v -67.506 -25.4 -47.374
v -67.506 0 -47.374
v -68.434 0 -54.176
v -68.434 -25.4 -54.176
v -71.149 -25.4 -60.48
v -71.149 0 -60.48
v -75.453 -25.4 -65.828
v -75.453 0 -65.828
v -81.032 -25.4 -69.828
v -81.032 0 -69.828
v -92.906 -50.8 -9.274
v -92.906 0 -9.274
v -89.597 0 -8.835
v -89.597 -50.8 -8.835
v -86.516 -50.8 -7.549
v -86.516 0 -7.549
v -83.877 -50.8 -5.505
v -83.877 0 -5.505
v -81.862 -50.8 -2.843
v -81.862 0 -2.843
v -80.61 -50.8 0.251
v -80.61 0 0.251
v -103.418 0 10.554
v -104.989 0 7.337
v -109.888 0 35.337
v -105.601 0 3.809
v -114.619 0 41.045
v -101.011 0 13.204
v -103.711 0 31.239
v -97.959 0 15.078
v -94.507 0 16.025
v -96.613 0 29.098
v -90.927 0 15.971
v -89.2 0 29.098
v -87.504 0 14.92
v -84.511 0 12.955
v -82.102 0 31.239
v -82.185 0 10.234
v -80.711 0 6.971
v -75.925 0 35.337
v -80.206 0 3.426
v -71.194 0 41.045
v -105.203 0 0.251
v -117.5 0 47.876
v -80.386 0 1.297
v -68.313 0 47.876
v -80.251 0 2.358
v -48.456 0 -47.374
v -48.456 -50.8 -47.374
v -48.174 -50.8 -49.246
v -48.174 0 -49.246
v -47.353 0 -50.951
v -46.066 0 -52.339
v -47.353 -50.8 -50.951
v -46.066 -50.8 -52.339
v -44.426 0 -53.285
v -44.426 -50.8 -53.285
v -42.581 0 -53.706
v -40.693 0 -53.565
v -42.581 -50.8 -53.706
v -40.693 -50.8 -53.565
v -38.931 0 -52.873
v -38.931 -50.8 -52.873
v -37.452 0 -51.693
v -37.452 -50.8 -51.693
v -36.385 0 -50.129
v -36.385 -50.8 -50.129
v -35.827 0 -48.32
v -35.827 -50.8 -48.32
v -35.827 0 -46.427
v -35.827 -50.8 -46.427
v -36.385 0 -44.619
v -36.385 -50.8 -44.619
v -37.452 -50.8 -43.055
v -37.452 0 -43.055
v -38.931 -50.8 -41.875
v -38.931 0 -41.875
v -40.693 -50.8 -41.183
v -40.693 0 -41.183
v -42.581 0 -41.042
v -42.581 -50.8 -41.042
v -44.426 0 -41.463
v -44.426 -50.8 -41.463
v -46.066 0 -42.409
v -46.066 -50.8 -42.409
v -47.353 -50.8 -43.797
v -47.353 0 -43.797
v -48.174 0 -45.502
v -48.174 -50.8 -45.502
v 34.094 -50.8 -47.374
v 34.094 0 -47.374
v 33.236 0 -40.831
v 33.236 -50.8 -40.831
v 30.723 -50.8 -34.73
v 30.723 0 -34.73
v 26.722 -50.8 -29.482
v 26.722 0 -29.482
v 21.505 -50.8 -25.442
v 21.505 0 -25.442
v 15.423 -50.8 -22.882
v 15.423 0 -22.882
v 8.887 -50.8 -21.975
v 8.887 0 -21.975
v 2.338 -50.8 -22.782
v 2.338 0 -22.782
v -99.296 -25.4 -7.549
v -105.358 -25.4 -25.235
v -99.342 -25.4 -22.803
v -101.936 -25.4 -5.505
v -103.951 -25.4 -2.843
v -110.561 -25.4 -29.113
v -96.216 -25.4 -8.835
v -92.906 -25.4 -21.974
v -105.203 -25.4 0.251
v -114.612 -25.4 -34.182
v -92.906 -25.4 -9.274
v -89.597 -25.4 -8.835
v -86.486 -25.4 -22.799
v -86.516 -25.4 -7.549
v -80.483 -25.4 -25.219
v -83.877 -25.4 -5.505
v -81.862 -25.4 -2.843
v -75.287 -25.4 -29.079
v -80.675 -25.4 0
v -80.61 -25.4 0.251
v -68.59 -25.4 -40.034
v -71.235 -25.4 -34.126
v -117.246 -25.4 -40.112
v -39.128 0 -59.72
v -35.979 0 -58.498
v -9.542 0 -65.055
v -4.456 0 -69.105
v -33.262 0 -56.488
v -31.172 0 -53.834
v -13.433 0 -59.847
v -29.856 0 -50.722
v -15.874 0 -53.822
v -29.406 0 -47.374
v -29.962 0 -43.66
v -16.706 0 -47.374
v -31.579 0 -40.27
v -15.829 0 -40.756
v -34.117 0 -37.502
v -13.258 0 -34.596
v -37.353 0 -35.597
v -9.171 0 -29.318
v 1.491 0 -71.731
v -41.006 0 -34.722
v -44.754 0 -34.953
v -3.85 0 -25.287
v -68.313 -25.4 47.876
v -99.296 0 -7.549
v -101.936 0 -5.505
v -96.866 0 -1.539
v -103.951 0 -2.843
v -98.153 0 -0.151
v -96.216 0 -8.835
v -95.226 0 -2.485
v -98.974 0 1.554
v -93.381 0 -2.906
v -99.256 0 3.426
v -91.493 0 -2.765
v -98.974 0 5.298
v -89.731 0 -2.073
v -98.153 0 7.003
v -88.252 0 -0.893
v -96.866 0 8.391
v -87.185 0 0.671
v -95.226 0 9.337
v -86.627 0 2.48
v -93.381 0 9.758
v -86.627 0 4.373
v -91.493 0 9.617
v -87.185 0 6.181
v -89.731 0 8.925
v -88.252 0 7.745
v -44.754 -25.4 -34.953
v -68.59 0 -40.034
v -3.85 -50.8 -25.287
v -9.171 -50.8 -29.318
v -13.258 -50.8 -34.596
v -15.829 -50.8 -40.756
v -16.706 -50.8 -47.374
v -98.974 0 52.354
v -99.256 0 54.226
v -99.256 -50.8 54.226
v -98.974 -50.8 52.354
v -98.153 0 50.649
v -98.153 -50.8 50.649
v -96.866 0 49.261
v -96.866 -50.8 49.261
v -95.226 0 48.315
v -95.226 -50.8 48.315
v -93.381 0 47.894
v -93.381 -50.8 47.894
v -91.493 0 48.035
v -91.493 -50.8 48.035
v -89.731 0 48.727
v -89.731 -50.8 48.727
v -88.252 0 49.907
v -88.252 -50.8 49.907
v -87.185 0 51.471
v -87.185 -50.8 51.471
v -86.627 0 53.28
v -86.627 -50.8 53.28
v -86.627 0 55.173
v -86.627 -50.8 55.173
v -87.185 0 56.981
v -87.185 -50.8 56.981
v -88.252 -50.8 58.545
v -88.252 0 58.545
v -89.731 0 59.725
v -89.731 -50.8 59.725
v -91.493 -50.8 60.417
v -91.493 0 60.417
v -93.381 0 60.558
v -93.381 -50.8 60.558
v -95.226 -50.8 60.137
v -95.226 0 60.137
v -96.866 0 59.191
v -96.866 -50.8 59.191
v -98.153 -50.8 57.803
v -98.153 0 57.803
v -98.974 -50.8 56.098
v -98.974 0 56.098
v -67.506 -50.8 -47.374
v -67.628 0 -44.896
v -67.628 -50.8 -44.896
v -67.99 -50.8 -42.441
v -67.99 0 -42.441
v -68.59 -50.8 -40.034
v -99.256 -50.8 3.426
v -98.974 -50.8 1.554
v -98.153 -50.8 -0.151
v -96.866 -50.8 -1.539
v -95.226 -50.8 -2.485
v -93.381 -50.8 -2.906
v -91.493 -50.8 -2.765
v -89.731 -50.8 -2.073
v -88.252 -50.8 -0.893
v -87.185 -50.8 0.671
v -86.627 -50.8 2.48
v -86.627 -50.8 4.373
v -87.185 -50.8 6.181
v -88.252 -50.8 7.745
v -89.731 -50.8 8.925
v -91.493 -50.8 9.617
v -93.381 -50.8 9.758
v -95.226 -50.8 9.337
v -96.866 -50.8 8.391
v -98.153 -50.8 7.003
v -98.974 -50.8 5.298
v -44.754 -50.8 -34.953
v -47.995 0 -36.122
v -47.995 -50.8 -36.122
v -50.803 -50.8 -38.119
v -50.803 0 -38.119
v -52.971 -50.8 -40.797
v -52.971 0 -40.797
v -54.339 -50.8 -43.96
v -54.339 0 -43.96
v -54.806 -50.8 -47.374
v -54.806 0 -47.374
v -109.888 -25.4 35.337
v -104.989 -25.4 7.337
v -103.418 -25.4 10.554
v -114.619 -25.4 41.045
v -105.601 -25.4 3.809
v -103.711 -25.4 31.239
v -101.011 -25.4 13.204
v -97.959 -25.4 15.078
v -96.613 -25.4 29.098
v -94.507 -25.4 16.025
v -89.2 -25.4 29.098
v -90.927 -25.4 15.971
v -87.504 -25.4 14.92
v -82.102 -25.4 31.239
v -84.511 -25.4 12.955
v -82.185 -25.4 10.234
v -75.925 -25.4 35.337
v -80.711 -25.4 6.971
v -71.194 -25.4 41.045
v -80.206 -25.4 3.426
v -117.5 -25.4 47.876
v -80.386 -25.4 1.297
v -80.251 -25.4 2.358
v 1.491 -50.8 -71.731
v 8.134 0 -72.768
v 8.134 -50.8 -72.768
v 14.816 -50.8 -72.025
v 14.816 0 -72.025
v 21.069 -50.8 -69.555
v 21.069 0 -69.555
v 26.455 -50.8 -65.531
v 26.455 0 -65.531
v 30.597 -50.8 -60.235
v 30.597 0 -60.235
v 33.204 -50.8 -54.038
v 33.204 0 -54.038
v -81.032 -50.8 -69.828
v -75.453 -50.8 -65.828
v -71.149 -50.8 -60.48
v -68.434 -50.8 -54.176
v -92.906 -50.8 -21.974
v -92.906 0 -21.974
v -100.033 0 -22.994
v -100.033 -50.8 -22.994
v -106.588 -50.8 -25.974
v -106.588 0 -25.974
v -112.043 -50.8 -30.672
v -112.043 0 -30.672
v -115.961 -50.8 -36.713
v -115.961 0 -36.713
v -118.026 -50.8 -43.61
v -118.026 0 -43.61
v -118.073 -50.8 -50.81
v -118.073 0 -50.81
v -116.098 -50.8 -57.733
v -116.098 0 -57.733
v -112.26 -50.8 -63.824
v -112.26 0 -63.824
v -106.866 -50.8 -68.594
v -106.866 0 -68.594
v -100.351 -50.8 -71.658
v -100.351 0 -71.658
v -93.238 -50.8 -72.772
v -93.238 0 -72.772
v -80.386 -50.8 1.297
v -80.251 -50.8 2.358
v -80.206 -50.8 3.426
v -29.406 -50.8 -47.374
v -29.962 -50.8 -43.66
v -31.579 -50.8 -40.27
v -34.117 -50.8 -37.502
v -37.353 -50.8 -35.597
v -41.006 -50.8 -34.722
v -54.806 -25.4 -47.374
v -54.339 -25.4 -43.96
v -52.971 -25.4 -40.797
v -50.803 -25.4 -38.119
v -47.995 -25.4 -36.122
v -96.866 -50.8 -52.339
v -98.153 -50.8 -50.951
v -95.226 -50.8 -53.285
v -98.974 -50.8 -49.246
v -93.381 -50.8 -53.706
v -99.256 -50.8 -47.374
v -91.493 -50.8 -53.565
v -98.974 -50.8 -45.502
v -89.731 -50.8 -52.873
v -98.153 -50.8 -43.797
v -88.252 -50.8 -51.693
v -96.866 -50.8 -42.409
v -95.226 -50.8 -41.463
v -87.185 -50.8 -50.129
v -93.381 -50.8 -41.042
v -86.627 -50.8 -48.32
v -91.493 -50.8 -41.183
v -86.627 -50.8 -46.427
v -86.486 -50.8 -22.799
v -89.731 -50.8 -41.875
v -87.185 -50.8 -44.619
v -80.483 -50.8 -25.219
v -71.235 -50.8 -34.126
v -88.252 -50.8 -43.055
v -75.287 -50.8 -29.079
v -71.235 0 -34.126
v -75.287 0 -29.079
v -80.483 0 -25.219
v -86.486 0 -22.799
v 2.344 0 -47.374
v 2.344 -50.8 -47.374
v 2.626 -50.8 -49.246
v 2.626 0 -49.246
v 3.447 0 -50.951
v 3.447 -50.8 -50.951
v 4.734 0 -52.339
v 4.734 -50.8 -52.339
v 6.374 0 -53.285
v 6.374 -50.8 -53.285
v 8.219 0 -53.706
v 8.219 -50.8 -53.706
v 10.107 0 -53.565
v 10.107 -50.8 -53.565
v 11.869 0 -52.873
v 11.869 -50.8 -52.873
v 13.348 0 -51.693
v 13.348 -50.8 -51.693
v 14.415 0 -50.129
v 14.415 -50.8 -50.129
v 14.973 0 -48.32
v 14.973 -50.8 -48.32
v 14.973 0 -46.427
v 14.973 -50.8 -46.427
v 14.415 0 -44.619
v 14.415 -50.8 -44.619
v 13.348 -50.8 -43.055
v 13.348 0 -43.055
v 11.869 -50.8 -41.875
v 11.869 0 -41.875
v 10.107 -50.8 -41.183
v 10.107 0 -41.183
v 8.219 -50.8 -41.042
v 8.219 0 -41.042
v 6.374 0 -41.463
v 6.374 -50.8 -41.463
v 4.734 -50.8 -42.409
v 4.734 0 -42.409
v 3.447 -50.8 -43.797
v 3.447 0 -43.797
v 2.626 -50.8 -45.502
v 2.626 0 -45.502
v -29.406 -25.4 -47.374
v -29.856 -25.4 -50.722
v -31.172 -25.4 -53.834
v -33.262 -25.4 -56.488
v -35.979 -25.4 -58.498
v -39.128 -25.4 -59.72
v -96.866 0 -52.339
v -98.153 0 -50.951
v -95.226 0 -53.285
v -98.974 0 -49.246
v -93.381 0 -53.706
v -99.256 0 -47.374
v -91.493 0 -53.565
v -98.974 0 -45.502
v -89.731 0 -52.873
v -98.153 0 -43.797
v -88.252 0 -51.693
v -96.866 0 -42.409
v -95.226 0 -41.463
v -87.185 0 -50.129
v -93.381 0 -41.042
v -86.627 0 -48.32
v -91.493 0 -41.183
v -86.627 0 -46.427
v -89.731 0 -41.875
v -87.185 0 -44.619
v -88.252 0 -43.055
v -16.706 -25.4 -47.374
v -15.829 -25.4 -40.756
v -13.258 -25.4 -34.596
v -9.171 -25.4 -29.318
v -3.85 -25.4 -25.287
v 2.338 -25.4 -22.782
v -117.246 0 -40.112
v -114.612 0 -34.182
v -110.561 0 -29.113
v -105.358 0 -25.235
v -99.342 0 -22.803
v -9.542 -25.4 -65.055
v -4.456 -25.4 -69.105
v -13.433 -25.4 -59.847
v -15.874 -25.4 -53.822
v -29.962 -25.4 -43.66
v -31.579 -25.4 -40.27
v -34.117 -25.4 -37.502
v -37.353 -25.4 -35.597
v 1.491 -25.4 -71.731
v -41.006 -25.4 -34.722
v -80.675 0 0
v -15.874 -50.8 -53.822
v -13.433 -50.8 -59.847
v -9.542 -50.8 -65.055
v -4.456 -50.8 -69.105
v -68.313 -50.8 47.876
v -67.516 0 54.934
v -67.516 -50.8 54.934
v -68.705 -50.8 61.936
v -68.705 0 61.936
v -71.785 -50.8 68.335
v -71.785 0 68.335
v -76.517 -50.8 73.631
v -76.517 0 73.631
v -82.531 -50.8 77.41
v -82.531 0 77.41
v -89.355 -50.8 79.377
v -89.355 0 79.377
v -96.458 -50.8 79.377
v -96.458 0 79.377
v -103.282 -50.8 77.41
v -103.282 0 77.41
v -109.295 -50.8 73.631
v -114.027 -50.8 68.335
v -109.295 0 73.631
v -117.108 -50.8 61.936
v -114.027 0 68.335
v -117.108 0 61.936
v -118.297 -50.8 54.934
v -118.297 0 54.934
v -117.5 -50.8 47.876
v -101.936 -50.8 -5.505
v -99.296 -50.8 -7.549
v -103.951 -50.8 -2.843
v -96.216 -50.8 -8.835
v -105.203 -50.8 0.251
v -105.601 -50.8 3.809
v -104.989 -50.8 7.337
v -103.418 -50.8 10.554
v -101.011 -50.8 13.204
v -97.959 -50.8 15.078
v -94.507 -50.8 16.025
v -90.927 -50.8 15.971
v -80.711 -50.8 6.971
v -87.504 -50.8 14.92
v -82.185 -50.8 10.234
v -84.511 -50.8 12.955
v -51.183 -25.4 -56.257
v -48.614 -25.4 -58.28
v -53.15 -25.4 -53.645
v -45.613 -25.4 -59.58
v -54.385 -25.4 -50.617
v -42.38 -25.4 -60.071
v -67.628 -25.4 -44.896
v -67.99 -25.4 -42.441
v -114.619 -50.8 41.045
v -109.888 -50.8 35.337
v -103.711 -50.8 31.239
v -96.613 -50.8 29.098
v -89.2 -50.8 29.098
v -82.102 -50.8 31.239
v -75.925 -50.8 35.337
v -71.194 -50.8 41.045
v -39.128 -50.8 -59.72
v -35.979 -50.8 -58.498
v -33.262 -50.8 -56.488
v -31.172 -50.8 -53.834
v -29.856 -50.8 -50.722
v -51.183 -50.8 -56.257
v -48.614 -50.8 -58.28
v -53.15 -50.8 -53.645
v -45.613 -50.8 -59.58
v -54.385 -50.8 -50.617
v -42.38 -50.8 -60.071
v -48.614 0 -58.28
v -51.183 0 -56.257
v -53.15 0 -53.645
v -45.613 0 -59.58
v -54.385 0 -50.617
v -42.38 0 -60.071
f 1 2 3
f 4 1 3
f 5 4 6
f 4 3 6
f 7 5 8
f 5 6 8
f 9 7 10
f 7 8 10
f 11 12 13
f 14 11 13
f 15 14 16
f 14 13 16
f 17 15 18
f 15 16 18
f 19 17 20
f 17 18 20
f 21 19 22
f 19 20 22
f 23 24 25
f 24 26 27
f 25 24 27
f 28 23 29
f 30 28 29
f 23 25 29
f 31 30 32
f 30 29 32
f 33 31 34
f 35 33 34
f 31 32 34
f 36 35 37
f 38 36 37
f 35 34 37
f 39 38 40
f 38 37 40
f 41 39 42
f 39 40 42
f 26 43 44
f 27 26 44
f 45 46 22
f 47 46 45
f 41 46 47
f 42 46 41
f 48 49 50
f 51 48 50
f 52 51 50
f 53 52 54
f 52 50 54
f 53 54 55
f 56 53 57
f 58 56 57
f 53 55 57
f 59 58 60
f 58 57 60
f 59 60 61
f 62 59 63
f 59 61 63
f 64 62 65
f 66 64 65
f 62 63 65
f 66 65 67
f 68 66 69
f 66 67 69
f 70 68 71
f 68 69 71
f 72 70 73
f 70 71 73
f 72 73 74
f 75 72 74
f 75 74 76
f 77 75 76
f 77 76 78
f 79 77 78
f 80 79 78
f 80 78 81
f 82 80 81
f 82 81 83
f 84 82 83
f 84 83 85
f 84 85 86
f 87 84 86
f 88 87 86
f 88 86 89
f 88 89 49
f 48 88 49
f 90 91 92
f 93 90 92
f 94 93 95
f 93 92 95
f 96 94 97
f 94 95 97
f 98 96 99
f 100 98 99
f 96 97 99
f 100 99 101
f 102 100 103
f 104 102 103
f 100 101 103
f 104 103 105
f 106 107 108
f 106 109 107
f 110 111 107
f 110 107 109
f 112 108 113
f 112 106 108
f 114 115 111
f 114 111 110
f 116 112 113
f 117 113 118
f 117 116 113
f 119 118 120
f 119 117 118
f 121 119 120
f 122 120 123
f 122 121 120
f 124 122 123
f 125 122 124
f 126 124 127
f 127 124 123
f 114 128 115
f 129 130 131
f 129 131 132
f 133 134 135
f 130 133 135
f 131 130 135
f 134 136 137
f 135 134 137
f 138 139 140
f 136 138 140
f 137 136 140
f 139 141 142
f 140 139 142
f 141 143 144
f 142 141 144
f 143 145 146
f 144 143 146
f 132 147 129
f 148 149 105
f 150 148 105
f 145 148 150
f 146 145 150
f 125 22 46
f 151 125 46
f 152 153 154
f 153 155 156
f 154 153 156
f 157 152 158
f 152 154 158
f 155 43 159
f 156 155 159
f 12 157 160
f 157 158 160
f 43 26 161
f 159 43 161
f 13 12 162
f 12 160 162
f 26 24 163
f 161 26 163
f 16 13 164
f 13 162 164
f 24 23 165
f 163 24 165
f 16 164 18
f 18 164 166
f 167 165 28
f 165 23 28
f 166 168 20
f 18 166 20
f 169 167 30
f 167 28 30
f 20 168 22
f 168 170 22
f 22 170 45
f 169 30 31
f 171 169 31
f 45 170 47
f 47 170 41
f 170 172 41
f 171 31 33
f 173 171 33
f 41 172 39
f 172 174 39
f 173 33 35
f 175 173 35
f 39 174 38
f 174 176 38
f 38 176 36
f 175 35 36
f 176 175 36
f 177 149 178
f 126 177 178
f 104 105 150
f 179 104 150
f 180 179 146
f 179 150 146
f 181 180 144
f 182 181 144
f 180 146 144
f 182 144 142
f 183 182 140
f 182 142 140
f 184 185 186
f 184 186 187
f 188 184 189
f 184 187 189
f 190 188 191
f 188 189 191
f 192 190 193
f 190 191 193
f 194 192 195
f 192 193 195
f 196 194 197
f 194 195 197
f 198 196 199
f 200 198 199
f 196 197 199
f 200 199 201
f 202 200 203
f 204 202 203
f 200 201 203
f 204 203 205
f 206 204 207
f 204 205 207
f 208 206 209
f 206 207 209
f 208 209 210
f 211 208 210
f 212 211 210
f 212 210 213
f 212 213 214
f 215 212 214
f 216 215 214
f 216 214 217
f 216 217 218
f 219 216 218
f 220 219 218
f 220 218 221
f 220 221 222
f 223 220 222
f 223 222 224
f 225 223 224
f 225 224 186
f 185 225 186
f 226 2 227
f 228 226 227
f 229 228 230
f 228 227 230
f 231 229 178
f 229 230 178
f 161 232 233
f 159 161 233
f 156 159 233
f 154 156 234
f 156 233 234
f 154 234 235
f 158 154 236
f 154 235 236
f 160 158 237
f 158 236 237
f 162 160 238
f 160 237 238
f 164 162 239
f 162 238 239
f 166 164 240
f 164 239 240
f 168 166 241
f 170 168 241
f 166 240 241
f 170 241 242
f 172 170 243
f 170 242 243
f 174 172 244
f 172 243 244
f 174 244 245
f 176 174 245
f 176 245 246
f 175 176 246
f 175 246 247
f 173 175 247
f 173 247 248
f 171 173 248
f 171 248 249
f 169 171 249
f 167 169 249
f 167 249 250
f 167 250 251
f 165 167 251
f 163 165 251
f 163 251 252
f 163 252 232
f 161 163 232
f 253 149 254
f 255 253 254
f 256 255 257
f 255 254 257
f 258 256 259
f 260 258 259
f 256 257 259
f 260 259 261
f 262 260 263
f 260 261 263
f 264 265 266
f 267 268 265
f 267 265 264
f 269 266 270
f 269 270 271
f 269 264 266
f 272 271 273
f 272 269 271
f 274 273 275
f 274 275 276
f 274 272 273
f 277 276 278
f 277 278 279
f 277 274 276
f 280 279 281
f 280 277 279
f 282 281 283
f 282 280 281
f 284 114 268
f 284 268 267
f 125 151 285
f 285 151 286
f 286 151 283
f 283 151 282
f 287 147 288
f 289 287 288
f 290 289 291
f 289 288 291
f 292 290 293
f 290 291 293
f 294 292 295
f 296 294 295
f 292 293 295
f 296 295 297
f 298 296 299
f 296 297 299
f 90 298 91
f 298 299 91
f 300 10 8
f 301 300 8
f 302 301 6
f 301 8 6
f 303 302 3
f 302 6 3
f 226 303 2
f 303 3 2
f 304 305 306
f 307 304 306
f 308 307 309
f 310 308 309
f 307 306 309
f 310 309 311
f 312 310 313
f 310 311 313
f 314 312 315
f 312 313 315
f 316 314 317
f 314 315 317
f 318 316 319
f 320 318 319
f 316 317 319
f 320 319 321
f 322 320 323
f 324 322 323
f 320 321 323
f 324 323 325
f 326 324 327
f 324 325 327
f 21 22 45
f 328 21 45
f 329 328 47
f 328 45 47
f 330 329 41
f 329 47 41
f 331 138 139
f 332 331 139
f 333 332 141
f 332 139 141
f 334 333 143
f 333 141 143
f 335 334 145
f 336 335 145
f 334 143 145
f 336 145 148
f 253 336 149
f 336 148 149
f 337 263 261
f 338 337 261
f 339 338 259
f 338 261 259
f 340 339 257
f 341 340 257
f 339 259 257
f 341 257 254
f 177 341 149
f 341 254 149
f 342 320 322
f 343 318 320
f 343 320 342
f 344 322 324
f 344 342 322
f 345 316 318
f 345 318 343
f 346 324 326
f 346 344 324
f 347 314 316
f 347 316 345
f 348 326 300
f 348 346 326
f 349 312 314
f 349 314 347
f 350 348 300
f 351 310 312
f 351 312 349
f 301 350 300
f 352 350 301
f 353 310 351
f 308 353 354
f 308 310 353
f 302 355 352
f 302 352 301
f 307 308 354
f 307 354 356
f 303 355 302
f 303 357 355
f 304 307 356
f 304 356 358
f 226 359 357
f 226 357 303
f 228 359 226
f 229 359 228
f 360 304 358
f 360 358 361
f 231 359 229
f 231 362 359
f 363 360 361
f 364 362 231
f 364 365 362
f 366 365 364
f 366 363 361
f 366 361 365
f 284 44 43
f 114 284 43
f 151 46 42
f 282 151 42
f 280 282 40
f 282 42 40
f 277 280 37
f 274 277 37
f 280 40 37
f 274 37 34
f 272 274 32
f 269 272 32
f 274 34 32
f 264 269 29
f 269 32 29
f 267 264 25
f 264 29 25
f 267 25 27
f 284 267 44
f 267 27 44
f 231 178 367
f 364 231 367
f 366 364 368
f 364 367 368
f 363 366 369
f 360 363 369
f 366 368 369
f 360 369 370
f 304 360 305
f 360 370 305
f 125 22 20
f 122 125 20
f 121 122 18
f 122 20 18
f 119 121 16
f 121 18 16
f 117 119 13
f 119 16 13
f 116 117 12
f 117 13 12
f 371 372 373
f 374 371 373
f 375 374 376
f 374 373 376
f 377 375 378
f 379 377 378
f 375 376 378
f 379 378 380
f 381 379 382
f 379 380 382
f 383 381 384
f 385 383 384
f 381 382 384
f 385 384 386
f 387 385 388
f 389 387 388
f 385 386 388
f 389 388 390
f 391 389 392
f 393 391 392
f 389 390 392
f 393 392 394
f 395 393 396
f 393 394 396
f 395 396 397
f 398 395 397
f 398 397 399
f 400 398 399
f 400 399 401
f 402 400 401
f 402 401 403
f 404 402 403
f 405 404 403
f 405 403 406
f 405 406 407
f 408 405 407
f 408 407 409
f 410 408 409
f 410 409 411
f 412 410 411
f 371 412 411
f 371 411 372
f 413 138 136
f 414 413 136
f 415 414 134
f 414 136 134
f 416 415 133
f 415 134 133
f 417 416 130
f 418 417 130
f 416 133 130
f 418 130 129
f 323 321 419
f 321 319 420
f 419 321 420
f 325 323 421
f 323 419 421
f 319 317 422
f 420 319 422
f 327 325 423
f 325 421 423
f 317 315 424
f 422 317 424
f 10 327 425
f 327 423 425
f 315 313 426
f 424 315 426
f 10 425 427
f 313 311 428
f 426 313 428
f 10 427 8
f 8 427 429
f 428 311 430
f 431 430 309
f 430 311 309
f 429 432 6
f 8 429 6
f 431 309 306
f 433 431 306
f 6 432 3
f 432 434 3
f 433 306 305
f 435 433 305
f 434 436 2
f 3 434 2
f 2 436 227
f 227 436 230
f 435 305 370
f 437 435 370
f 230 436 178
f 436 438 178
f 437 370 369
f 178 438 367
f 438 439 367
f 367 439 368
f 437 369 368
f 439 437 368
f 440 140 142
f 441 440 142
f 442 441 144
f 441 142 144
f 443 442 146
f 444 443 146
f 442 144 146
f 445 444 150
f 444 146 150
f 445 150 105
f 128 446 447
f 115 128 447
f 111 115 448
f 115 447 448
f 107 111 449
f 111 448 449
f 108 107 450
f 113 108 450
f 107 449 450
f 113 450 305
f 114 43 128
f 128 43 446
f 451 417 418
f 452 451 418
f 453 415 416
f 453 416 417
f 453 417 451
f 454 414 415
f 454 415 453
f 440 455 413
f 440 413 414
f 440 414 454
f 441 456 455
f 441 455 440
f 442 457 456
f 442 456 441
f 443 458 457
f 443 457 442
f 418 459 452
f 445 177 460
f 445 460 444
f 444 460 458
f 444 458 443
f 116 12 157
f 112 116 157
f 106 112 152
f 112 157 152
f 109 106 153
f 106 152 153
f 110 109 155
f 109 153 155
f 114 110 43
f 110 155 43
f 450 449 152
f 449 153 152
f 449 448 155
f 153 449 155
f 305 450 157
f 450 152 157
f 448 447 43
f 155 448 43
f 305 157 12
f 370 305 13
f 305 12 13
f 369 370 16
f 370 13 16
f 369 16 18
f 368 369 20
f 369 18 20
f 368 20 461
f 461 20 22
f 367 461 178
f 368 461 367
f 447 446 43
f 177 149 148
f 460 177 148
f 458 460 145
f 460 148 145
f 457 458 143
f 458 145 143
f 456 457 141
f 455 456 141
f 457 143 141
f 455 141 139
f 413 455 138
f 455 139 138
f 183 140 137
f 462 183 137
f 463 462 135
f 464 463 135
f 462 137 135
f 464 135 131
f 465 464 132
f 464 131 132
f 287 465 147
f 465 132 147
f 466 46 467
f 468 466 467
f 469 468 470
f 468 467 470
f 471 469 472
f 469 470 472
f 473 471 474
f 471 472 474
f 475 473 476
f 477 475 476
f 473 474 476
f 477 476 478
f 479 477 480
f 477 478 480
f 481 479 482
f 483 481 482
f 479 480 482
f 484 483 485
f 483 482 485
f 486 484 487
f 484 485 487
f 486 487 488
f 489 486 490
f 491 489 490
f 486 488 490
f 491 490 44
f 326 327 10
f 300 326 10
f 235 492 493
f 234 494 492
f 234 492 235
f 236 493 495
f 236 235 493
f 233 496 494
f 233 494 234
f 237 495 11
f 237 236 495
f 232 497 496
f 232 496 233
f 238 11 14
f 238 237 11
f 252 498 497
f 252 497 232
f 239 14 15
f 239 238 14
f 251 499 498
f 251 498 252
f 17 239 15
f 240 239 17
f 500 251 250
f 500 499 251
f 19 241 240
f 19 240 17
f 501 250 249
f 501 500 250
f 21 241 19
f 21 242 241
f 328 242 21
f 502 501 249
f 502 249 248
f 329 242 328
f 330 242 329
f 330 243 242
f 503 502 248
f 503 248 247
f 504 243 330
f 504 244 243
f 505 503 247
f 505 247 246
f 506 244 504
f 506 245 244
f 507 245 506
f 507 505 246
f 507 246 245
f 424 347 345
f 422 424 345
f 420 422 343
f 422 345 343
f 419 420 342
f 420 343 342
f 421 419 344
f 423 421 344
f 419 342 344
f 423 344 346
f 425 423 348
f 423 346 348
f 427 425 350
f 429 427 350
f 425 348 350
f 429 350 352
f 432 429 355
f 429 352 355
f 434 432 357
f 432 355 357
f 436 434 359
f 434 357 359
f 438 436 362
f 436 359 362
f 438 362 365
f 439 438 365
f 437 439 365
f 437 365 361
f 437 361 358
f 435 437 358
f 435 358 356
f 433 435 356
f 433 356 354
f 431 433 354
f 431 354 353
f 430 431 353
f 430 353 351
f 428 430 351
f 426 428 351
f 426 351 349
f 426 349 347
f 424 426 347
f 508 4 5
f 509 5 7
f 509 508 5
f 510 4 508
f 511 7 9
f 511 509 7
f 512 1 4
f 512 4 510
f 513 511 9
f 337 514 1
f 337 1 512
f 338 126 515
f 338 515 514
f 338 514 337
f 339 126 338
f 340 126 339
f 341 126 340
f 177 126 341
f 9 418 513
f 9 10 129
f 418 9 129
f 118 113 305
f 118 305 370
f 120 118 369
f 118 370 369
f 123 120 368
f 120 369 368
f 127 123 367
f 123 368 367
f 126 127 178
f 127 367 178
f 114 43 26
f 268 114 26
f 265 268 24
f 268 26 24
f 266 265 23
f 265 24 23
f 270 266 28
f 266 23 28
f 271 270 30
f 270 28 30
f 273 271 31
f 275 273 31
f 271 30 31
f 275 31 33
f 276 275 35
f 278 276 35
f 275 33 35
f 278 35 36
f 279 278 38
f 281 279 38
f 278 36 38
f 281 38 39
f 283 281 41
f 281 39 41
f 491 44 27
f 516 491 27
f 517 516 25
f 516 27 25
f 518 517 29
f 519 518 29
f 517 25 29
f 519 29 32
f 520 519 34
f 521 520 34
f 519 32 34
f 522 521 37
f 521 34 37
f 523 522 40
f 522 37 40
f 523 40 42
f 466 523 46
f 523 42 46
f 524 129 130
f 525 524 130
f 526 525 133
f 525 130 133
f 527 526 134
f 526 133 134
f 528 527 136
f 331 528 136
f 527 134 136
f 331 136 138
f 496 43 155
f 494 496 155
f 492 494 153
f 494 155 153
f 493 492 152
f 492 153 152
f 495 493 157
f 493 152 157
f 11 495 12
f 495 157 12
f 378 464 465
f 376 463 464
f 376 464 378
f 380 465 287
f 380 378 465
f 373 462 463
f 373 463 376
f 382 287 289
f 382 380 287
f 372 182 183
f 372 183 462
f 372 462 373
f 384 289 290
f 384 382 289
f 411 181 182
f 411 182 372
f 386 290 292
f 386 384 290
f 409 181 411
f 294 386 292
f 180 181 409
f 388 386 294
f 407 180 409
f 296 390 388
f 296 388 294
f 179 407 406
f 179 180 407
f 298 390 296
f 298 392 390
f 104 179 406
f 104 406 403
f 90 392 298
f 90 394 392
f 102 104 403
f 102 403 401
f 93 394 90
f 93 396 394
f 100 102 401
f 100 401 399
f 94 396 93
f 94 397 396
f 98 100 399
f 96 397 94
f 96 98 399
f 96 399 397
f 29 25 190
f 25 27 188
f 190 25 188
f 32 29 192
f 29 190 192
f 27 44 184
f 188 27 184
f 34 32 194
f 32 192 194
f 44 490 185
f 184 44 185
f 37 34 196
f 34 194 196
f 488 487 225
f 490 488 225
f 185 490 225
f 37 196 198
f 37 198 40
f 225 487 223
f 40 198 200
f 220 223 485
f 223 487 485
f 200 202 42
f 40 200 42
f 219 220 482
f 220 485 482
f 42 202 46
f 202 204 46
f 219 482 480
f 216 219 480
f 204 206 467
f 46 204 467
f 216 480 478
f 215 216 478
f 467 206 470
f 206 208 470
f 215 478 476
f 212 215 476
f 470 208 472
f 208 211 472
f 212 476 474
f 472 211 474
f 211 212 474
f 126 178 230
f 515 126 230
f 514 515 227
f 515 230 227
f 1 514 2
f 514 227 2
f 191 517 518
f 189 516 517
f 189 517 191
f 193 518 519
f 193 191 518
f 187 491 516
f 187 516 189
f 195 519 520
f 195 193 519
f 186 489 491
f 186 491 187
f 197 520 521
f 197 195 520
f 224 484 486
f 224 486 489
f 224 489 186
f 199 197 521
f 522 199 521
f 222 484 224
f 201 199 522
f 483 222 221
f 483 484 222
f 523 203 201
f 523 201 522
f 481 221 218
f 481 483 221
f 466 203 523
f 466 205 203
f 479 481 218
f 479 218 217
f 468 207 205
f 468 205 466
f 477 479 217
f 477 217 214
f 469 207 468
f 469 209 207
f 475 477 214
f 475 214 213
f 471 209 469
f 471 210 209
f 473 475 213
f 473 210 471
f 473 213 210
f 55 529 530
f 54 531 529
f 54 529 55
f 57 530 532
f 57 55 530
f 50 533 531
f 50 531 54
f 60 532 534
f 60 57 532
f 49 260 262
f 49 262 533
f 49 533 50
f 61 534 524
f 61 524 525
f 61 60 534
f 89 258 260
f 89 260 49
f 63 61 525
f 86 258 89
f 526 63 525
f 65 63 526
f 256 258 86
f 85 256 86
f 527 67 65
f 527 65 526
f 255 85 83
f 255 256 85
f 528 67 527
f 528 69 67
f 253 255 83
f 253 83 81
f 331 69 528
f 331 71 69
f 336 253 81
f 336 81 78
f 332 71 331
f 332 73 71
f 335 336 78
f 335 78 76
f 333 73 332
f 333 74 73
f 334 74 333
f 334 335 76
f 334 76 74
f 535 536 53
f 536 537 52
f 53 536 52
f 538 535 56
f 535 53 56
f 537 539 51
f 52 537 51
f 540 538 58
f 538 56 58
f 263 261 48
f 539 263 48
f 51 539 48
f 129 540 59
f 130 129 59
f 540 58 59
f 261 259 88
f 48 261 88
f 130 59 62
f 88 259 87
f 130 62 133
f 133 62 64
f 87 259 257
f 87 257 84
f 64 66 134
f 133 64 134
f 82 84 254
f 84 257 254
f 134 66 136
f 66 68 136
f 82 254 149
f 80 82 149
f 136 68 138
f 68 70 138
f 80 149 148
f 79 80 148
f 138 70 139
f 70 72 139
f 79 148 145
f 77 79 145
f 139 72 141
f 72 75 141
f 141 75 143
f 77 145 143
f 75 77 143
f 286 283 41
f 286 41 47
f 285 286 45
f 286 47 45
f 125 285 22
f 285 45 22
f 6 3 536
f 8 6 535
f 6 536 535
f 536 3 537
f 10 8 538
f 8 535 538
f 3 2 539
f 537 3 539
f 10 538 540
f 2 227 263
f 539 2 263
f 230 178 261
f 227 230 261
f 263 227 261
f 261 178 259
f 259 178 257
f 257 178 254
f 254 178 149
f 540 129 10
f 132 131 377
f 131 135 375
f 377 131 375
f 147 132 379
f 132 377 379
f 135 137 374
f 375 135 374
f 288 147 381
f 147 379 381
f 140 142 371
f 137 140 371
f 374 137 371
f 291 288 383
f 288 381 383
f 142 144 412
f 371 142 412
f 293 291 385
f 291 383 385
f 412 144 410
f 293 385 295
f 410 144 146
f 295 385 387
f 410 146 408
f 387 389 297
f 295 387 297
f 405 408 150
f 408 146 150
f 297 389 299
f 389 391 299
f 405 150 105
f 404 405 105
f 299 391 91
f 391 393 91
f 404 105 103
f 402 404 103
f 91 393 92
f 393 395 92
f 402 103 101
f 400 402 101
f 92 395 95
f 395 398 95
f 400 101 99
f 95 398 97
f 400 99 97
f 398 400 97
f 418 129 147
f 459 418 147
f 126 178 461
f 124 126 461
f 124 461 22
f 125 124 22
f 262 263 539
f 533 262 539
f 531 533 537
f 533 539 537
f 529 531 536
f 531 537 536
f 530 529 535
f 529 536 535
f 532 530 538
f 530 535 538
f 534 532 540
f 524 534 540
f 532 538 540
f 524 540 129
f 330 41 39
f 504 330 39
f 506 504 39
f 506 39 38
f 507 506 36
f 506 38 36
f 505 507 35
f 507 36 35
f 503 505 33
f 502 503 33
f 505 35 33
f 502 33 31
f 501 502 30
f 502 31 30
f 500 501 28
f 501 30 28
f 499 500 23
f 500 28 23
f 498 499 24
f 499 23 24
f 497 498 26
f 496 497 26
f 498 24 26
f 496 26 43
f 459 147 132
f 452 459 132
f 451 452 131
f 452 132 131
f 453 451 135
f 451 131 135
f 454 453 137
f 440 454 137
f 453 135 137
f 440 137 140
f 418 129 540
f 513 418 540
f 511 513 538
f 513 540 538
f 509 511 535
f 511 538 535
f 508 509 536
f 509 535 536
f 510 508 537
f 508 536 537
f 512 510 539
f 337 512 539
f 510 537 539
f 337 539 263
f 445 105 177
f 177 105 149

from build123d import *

# Parameters (mm, degrees)
F1_DEPTH = 50.8
F2_DEPTH = 25.4
F3_D     = 12.7
F3_2_D   = 12.7
F3_3_D   = 12.7
F3_4_D   = 12.7
F3_5_D   = 12.7


with BuildPart() as f1:
    # F0 (on Front) → F1 (new body)
    with BuildSketch(Plane.XZ):
        with BuildLine():
            ThreePointArc((-92.9063978889, 28.8260975842), (-77.3521380222, 34.1456344421), (-68.3129536404, 47.8760975842))
            ThreePointArc((-68.3129536404, 47.8760975842), (-67.7088436037, 51.0255885551), (-67.5063978889, 54.2260975842))
            ThreePointArc((-67.5063978889, 54.2260975842), (-96.1069069179, 79.4236518694), (-117.4998421373, 47.8760975842))
            ThreePointArc((-117.4998421373, 47.8760975842), (-108.4606577555, 34.1456344421), (-92.9063978889, 28.8260975842))
        make_face()
    extrude(amount=F1_DEPTH)

    # F3 (through all)
    with Locations(Plane(origin=(0, 0, 0), x_dir=(1, 0, 0), z_dir=(0, 1, 0))):
        with Locations((-92.9063978889, 47.3739024158), (-92.9063978889, -3.4260975842), (-92.9063978889, -54.2260975842), (-42.1063978889, 47.3739024158), (8.6936021111, 47.3739024158)):
            Hole(F3_D / 2)


with BuildPart() as f1b:
    # F0 (on Front) → F1, piece 2 (new body)
    with BuildSketch(Plane.XZ):
        with BuildLine():
            Line((-92.9063978889, 3.4260975842), (-92.9063978889, -9.2739024158))
            ThreePointArc((-92.9063978889, -9.2739024158), (-85.1292681832, -6.6141341632), (-80.6096759086, 0.2510970266))
            ThreePointArc((-80.6096759086, 0.2510970266), (-80.3076207826, 1.825842784), (-80.2063978889, 3.4260975842))
            ThreePointArc((-80.2063978889, 3.4260975842), (-83.9261417678, 12.4063537053), (-92.9063978889, 16.1260975842))
            Line((-92.9063978889, 16.1260975842), (-92.9063978889, 3.4260975842))
        make_face()
        with BuildLine():
            ThreePointArc((-105.2031200131, 0.2510975842), (-100.6835278222, -6.6141339869), (-92.9063978889, -9.2739024158))
            Line((-92.9063978889, -9.2739024158), (-92.9063978889, 3.4260975842))
            Line((-92.9063978889, 3.4260975842), (-92.9063978889, 16.1260975842))
            ThreePointArc((-92.9063978889, 16.1260975842), (-102.9466294599, 11.2032275175), (-105.2031200131, 0.2510975842))
        make_face()
    extrude(amount=F1_DEPTH)

    # F3#2 (through all)
    with Locations(Plane(origin=(0, 0, 0), x_dir=(1, 0, 0), z_dir=(0, 1, 0))):
        with Locations((-92.9063978889, 47.3739024158), (-92.9063978889, -3.4260975842), (-92.9063978889, -54.2260975842), (-42.1063978889, 47.3739024158), (8.6936021111, 47.3739024158)):
            Hole(F3_2_D / 2)


with BuildPart() as f1c:
    # F0 (on Front) → F1, piece 3 (new body)
    with BuildSketch(Plane.XZ):
        with BuildLine():
            ThreePointArc((-81.0323340741, -69.8275570966), (-71.149086234, -60.4803660713), (-67.5063978889, -47.3739024158))
            Line((-67.5063978889, -47.3739024158), (-92.9063978889, -47.3739024158))
            Line((-92.9063978889, -47.3739024158), (-92.9063978889, -21.9739024158))
            ThreePointArc((-92.9063978889, -21.9739024158), (-108.0836918534, -27.0070237175), (-117.2460912074, -40.1117175408))
            ThreePointArc((-117.2460912074, -40.1117175408), (-113.3719442813, -62.4178849624), (-93.2380952331, -72.7717365139))
            Line((-93.2380952331, -72.7717365139), (-81.0323340741, -69.8275570966))
        make_face()
        with BuildLine():
            Line((-92.9063978889, -47.3739024158), (-67.5063978889, -47.3739024158))
            ThreePointArc((-67.5063978889, -47.3739024158), (-67.7787746086, -43.6641115478), (-68.5900631081, -40.0338845119))
            ThreePointArc((-68.5900631081, -40.0338845119), (-77.7617033518, -26.9827713197), (-92.9063978889, -21.9739024158))
            Line((-92.9063978889, -21.9739024158), (-92.9063978889, -47.3739024158))
        make_face()
    extrude(amount=F1_DEPTH)

    # F3#3 (through all)
    with Locations(Plane(origin=(0, 0, 0), x_dir=(1, 0, 0), z_dir=(0, 1, 0))):
        with Locations((-92.9063978889, 47.3739024158), (-92.9063978889, -3.4260975842), (-92.9063978889, -54.2260975842), (-42.1063978889, 47.3739024158), (8.6936021111, 47.3739024158)):
            Hole(F3_3_D / 2)


with BuildPart() as f1d:
    # F0 (on Front) → F1, piece 4 (new body)
    with BuildSketch(Plane.XZ):
        with BuildLine():
            ThreePointArc((2.3377599205, -22.7819673547), (-11.3887084088, -31.8220277964), (-16.7063978889, -47.3739024158))
            ThreePointArc((-16.7063978889, -47.3739024158), (-11.6547110887, -62.5760782443), (1.4909367505, -71.7312752565))
            ThreePointArc((1.4909367505, -71.7312752565), (23.8957779396, -67.7222156157), (34.0936021111, -47.3739024158))
            ThreePointArc((34.0936021111, -47.3739024158), (24.2454767306, -27.2915918958), (2.3377599205, -22.7819673547))
        make_face()
    extrude(amount=F1_DEPTH)

    # F3#4 (through all)
    with Locations(Plane(origin=(0, 0, 0), x_dir=(1, 0, 0), z_dir=(0, 1, 0))):
        with Locations((-92.9063978889, 47.3739024158), (-92.9063978889, -3.4260975842), (-92.9063978889, -54.2260975842), (-42.1063978889, 47.3739024158), (8.6936021111, 47.3739024158)):
            Hole(F3_4_D / 2)


with BuildPart() as f1e:
    # F0 (on Front) → F1, piece 5 (new body)
    with BuildSketch(Plane.XZ):
        with BuildLine():
            Line((-54.8063978889, -47.3739024158), (-42.1063978889, -47.3739024158))
            Line((-42.1063978889, -47.3739024158), (-29.4063978889, -47.3739024158))
            ThreePointArc((-29.4063978889, -47.3739024158), (-34.1168870071, -37.5018349591), (-44.7540696795, -34.9529590503))
            ThreePointArc((-44.7540696795, -34.9529590503), (-51.9784653456, -39.3843915341), (-54.8063978889, -47.3739024158))
        make_face()
        with BuildLine():
            Line((-29.4063978889, -47.3739024158), (-42.1063978889, -47.3739024158))
            Line((-42.1063978889, -47.3739024158), (-54.8063978889, -47.3739024158))
            ThreePointArc((-54.8063978889, -47.3739024158), (-49.9635467661, -57.3516382071), (-39.1284118225, -59.7198166788))
            ThreePointArc((-39.1284118225, -59.7198166788), (-32.1286620975, -55.231051293), (-29.4063978889, -47.3739024158))
        make_face()
    extrude(amount=F1_DEPTH)

    # F3#5 (through all)
    with Locations(Plane(origin=(0, 0, 0), x_dir=(1, 0, 0), z_dir=(0, 1, 0))):
        with Locations((-92.9063978889, 47.3739024158), (-92.9063978889, -3.4260975842), (-92.9063978889, -54.2260975842), (-42.1063978889, 47.3739024158), (8.6936021111, 47.3739024158)):
            Hole(F3_5_D / 2)


with BuildPart() as f2:
    # F0 (on Front) → F2 (new body)
    with BuildSketch(Plane.XZ):
        with BuildLine():
            Line((-117.4998421373, 47.8760975842), (-105.2031200131, 0.2510975842))
            ThreePointArc((-105.2031200131, 0.2510975842), (-102.9466294599, 11.2032275175), (-92.9063978889, 16.1260975842))
            Line((-92.9063978889, 16.1260975842), (-92.9063978889, 28.8260975842))
            ThreePointArc((-92.9063978889, 28.8260975842), (-108.4606577555, 34.1456344421), (-117.4998421373, 47.8760975842))
        make_face()
        with BuildLine():
            ThreePointArc((-80.2063978889, 3.4260975842), (-80.3076207826, 1.825842784), (-80.6096759086, 0.2510970266))
            Line((-80.6096759086, 0.2510970266), (-68.3129536404, 47.8760975842))
            ThreePointArc((-68.3129536404, 47.8760975842), (-77.3521380222, 34.1456344421), (-92.9063978889, 28.8260975842))
            Line((-92.9063978889, 28.8260975842), (-92.9063978889, 16.1260975842))
            ThreePointArc((-92.9063978889, 16.1260975842), (-83.9261417678, 12.4063537053), (-80.2063978889, 3.4260975842))
        make_face()
    extrude(amount=F2_DEPTH)


with BuildPart() as f2b:
    # F0 (on Front) → F2, piece 2 (new body)
    with BuildSketch(Plane.XZ):
        with BuildLine():
            ThreePointArc((-117.2460912074, -40.1117175408), (-108.0836918534, -27.0070237175), (-92.9063978889, -21.9739024158))
            Line((-92.9063978889, -21.9739024158), (-92.9063978889, -9.2739024158))
            ThreePointArc((-92.9063978889, -9.2739024158), (-100.6835278222, -6.6141339869), (-105.2031200131, 0.2510975842))
            Line((-105.2031200131, 0.2510975842), (-117.2460912074, -40.1117175408))
        make_face()
        with BuildLine():
            ThreePointArc((-92.9063978889, -21.9739024158), (-77.7617033518, -26.9827713197), (-68.5900631081, -40.0338845119))
            Line((-68.5900631081, -40.0338845119), (-80.6745088821, 0))
            Line((-80.6745088821, 0), (-80.6096759086, 0.2510970266))
            ThreePointArc((-80.6096759086, 0.2510970266), (-85.1292681832, -6.6141341632), (-92.9063978889, -9.2739024158))
            Line((-92.9063978889, -9.2739024158), (-92.9063978889, -21.9739024158))
        make_face()
    extrude(amount=F2_DEPTH)


with BuildPart() as f2c:
    # F0 (on Front) → F2, piece 3 (new body)
    with BuildSketch(Plane.XZ):
        with BuildLine():
            ThreePointArc((-44.7540696795, -34.9529590503), (-34.1168870071, -37.5018349591), (-29.4063978889, -47.3739024158))
            Line((-29.4063978889, -47.3739024158), (-16.7063978889, -47.3739024158))
            ThreePointArc((-16.7063978889, -47.3739024158), (-11.3887084088, -31.8220277964), (2.3377599205, -22.7819673547))
            Line((2.3377599205, -22.7819673547), (-44.7540696795, -34.9529590503))
        make_face()
        with BuildLine():
            Line((-16.7063978889, -47.3739024158), (-29.4063978889, -47.3739024158))
            ThreePointArc((-29.4063978889, -47.3739024158), (-32.1286620975, -55.231051293), (-39.1284118225, -59.7198166788))
            Line((-39.1284118225, -59.7198166788), (1.4909367505, -71.7312752565))
            ThreePointArc((1.4909367505, -71.7312752565), (-11.6547110887, -62.5760782443), (-16.7063978889, -47.3739024158))
        make_face()
    extrude(amount=F2_DEPTH)


with BuildPart() as f2d:
    # F0 (on Front) → F2, piece 4 (new body)
    with BuildSketch(Plane.XZ):
        with BuildLine():
            ThreePointArc((-39.1284118225, -59.7198166788), (-49.9635467661, -57.3516382071), (-54.8063978889, -47.3739024158))
            Line((-54.8063978889, -47.3739024158), (-67.5063978889, -47.3739024158))
            ThreePointArc((-67.5063978889, -47.3739024158), (-71.149086234, -60.4803660713), (-81.0323340741, -69.8275570966))
            Line((-81.0323340741, -69.8275570966), (-39.1284118225, -59.7198166788))
        make_face()
        with BuildLine():
            Line((-67.5063978889, -47.3739024158), (-54.8063978889, -47.3739024158))
            ThreePointArc((-54.8063978889, -47.3739024158), (-51.9784653456, -39.3843915341), (-44.7540696795, -34.9529590503))
            Line((-44.7540696795, -34.9529590503), (-68.5900631081, -40.0338845119))
            ThreePointArc((-68.5900631081, -40.0338845119), (-67.7787746086, -43.6641115478), (-67.5063978889, -47.3739024158))
        make_face()
    extrude(amount=F2_DEPTH)


solid = Compound([f1.part, f1b.part, f1c.part, f1d.part, f1e.part, f2.part, f2b.part, f2c.part, f2d.part])
